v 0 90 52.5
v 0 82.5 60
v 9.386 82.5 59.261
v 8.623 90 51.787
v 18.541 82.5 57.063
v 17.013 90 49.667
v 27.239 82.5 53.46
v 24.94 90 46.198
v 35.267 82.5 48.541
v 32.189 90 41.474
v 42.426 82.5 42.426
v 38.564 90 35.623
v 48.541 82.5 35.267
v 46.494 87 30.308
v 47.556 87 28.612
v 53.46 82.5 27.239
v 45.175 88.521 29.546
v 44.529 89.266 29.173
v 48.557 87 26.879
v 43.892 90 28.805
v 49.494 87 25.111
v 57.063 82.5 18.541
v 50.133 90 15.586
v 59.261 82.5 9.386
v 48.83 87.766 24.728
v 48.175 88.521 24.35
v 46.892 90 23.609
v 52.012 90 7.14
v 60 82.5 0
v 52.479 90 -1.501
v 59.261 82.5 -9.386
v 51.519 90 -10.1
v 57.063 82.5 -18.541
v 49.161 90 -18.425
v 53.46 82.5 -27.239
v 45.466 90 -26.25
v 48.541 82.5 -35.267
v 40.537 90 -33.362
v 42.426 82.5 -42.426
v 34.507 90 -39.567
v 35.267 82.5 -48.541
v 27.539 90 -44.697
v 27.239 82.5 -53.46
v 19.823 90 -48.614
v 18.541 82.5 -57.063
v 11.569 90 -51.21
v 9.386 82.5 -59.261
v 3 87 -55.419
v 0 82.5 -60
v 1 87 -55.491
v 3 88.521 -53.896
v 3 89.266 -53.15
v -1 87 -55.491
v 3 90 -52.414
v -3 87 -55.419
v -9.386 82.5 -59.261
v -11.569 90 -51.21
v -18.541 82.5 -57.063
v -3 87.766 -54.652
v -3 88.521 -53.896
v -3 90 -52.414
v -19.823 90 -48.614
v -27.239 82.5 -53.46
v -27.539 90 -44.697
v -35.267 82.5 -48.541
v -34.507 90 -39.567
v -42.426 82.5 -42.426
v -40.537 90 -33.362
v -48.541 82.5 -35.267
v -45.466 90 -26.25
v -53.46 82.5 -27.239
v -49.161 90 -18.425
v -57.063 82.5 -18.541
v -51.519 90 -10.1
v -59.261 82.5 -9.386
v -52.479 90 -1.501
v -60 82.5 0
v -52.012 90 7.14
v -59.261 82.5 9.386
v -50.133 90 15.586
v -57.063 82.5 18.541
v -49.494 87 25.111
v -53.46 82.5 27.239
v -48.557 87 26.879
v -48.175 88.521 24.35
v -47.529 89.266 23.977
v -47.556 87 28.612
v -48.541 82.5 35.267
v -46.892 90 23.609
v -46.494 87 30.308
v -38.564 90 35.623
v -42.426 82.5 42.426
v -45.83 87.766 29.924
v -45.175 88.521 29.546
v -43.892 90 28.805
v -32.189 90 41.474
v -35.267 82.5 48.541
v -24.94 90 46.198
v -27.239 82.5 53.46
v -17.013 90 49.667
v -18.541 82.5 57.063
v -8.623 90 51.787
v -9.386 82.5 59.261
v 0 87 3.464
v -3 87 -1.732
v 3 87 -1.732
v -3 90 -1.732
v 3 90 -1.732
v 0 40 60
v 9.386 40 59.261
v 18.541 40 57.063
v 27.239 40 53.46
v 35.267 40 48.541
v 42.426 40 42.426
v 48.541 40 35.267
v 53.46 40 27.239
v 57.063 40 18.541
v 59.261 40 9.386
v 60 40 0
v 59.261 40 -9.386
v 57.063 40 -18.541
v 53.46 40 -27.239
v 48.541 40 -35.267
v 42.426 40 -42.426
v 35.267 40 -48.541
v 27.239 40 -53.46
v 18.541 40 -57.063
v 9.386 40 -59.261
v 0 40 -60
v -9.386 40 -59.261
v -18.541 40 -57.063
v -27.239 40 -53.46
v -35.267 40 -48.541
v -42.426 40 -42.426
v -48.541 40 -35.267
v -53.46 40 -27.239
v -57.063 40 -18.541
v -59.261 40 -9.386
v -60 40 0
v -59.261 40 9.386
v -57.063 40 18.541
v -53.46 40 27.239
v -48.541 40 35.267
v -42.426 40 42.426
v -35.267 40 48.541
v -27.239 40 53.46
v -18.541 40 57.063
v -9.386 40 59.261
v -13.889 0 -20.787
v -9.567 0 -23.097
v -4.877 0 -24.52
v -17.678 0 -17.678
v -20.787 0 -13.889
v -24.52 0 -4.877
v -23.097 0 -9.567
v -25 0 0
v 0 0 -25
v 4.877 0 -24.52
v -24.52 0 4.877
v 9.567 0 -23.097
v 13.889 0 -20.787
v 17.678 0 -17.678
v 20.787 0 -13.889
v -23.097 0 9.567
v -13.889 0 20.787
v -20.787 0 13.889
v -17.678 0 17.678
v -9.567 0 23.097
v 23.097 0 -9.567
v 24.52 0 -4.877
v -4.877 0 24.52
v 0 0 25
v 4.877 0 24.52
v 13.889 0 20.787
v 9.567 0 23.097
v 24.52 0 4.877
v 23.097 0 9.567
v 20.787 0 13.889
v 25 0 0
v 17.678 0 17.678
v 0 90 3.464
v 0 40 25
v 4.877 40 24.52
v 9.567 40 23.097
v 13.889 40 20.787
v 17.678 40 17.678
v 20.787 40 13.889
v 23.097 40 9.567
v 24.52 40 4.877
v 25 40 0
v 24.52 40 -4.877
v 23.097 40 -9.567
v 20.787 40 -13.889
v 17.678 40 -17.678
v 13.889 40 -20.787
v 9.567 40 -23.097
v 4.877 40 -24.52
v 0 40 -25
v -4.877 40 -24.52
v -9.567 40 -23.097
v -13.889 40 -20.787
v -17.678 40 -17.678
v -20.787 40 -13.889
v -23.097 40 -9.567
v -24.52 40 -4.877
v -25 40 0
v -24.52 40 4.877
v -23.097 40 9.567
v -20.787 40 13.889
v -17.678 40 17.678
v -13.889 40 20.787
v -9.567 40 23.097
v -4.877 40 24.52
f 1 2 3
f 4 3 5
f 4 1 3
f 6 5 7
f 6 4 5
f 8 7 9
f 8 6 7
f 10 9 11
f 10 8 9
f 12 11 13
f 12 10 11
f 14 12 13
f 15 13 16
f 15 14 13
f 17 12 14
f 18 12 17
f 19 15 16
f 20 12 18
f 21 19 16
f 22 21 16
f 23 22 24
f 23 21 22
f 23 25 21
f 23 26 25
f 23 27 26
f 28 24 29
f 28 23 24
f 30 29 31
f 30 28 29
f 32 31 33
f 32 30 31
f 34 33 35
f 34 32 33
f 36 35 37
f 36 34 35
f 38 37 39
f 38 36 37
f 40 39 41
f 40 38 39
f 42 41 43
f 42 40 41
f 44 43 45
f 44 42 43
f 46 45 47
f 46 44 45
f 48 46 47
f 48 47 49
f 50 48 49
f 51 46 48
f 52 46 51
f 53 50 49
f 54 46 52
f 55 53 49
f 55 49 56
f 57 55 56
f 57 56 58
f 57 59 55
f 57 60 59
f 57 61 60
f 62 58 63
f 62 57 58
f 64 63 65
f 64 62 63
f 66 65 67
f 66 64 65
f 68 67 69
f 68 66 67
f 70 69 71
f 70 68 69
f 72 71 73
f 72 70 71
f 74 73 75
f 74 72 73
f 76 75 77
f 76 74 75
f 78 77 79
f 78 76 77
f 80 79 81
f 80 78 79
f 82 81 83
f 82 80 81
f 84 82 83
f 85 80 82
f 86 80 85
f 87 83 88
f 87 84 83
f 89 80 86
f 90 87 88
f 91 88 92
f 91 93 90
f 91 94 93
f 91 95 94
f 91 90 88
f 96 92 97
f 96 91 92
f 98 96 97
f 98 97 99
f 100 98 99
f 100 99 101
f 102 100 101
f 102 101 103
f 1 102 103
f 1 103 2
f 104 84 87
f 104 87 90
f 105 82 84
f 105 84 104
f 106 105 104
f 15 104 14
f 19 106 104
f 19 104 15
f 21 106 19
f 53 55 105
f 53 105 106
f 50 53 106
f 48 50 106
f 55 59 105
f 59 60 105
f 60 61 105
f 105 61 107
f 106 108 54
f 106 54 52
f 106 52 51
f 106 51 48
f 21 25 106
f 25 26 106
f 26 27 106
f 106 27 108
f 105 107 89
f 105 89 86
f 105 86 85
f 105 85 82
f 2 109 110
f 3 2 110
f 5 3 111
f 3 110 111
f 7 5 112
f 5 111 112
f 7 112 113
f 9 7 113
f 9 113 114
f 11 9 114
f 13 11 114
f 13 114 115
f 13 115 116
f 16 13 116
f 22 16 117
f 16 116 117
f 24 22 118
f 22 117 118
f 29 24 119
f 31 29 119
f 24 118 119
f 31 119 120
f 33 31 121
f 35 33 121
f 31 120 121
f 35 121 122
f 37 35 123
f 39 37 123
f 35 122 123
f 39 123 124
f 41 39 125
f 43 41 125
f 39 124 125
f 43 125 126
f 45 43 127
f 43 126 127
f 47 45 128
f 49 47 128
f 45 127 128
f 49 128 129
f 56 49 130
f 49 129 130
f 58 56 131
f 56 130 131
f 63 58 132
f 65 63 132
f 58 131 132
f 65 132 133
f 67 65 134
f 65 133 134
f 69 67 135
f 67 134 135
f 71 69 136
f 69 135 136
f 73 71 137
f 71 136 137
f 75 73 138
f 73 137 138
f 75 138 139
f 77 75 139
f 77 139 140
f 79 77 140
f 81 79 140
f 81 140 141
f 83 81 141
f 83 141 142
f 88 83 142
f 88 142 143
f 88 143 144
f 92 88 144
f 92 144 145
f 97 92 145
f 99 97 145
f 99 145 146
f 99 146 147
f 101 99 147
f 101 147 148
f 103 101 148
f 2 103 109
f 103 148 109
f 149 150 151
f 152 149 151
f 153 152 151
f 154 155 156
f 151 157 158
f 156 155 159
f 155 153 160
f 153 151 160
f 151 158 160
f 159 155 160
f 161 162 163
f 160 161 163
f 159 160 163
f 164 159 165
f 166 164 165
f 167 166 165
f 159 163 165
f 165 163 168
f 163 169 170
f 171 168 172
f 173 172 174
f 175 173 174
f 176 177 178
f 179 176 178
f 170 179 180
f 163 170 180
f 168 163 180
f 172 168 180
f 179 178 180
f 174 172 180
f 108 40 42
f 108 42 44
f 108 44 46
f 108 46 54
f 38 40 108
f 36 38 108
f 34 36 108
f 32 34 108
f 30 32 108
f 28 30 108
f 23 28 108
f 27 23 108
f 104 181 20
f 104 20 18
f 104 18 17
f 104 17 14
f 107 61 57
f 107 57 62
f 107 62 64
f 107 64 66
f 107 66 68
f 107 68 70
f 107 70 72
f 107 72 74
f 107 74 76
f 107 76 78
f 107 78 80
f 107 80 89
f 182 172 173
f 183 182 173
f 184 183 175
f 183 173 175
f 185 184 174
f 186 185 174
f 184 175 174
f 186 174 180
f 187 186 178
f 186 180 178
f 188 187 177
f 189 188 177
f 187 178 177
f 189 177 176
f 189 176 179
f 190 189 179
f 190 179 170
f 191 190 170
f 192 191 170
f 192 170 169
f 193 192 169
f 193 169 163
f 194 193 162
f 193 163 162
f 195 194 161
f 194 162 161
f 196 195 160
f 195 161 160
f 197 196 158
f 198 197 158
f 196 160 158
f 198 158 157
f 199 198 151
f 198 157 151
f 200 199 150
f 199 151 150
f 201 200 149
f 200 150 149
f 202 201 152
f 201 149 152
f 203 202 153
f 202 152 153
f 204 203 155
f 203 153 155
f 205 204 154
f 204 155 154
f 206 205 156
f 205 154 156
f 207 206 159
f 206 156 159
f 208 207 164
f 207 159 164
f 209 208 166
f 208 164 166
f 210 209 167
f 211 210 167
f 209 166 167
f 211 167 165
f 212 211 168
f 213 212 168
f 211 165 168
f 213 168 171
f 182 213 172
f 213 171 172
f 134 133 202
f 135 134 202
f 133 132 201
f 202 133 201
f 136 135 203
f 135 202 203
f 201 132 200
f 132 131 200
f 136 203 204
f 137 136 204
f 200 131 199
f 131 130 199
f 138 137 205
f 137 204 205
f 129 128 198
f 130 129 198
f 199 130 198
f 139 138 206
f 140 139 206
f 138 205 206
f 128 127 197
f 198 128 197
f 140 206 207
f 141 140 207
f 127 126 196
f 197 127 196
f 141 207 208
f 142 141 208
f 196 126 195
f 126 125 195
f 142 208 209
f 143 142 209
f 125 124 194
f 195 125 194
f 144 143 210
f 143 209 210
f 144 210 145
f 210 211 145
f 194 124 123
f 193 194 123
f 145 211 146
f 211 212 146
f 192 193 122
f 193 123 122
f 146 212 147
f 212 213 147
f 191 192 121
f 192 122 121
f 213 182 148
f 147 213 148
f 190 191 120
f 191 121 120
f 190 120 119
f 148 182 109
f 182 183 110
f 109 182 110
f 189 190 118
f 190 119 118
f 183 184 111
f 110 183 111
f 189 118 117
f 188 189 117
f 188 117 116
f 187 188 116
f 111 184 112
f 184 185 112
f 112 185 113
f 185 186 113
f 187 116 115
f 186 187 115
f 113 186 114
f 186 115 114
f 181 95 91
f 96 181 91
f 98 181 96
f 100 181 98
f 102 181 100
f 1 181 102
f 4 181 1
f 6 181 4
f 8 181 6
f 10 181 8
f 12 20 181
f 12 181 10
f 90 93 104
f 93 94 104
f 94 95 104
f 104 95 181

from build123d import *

# Parameters (mm, degrees)
SKETCH1_R           = 25
BOSS_EXTRUDE1_DEPTH = 40
SKETCH2_R           = 60
BOSS_EXTRUDE2_DEPTH = 50
CHAMFER1_SIZE       = 7.5
CUT_EXTRUDE1_DEPTH  = 3


with BuildPart() as part:
    # Sketch1 → Boss-Extrude1 (new body)
    with BuildSketch(Plane(origin=(0, 0, 0), x_dir=(1, 0, 0), z_dir=(0, 1, 0))):
        with Locations(Location((0, 0, 0), (0, 0, 270))):
            Circle(SKETCH1_R)
    extrude(amount=BOSS_EXTRUDE1_DEPTH)

    # Sketch2 → Boss-Extrude2 (add)
    with BuildSketch(Plane(origin=(0, 40, 0), x_dir=(1, 0, 0), z_dir=(0, 1, 0))):
        with Locations(Location((0, 0, 0), (0, 0, 270))):
            Circle(SKETCH2_R)
    extrude(amount=BOSS_EXTRUDE2_DEPTH)

    # Chamfer1
    chamfer1_edges = [part.edges().sort_by_distance(p)[0] for p in [
        (0, 90, -60),
    ]]
    chamfer(chamfer1_edges, length=CHAMFER1_SIZE)

    # Sketch3 → Cut-Extrude1 (cut)
    with BuildSketch(Plane(origin=(0, 90, 0), x_dir=(1, 0, 0), z_dir=(0, 1, 0))):
        with BuildLine():
            Line((-3, 1.732050808), (-53.461524227, -27.401923789))
            ThreePointArc((-53.461524227, -27.401923789), (-54.559600438, -31.5), (-50.461524227, -32.598076211))
            Line((-50.461524227, -32.598076211), (0, -3.464101615))
            Line((0, -3.464101615), (50.461524227, -32.598076211))
            ThreePointArc((50.461524227, -32.598076211), (54.559600438, -31.5), (53.461524227, -27.401923789))
            Line((53.461524227, -27.401923789), (3, 1.732050808))
            Line((3, 1.732050808), (3, 60))
            ThreePointArc((3, 60), (0, 63), (-3, 60))
            Line((-3, 60), (-3, 1.732050808))
        make_face()
    extrude(amount=-CUT_EXTRUDE1_DEPTH, mode=Mode.SUBTRACT)


solid = part.part
